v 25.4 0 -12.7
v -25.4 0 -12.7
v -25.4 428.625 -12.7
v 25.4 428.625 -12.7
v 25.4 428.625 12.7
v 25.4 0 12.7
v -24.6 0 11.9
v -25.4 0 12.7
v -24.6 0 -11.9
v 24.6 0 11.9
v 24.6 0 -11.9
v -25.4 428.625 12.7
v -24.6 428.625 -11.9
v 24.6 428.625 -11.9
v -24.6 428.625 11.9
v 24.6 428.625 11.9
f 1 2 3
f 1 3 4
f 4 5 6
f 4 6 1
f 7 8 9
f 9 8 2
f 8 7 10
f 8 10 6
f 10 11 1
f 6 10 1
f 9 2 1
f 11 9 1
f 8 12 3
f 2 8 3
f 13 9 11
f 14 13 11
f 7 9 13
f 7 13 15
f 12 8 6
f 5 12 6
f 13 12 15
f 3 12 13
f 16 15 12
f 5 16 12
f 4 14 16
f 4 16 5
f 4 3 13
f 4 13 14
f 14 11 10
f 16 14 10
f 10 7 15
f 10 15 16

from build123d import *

# Parameters (mm, degrees)
SKETCH1_W           = 50.8
SKETCH1_H           = 25.4
BOSS_EXTRUDE1_DEPTH = 762
SKETCH2_W           = 49.1998
SKETCH2_H           = 23.7998
CUT_EXTRUDE1_DEPTH  = 763.528983056
SKETCH3_W           = 50.8
SKETCH3_H           = 25.4
CUT_EXTRUDE2_DEPTH  = 333.375


with BuildPart() as part:
    # Sketch1 → Boss-Extrude1 (new body)
    with BuildSketch(Plane(origin=(0, 0, 0), x_dir=(1, 0, 0), z_dir=(0, 1, 0))):
        Rectangle(SKETCH1_W, SKETCH1_H)
    extrude(amount=BOSS_EXTRUDE1_DEPTH)

    # Sketch2 → Cut-Extrude1 (cut, through all)
    with BuildSketch(Plane.XZ):
        Rectangle(SKETCH2_W, SKETCH2_H)
    extrude(amount=-CUT_EXTRUDE1_DEPTH, mode=Mode.SUBTRACT)

    # Sketch3 → Cut-Extrude2 (cut)
    with BuildSketch(Plane(origin=(0, 762, 0), x_dir=(1, 0, 0), z_dir=(0, 1, 0))):
        Rectangle(SKETCH3_W, SKETCH3_H)
    extrude(amount=-CUT_EXTRUDE2_DEPTH, mode=Mode.SUBTRACT)


solid = part.part
